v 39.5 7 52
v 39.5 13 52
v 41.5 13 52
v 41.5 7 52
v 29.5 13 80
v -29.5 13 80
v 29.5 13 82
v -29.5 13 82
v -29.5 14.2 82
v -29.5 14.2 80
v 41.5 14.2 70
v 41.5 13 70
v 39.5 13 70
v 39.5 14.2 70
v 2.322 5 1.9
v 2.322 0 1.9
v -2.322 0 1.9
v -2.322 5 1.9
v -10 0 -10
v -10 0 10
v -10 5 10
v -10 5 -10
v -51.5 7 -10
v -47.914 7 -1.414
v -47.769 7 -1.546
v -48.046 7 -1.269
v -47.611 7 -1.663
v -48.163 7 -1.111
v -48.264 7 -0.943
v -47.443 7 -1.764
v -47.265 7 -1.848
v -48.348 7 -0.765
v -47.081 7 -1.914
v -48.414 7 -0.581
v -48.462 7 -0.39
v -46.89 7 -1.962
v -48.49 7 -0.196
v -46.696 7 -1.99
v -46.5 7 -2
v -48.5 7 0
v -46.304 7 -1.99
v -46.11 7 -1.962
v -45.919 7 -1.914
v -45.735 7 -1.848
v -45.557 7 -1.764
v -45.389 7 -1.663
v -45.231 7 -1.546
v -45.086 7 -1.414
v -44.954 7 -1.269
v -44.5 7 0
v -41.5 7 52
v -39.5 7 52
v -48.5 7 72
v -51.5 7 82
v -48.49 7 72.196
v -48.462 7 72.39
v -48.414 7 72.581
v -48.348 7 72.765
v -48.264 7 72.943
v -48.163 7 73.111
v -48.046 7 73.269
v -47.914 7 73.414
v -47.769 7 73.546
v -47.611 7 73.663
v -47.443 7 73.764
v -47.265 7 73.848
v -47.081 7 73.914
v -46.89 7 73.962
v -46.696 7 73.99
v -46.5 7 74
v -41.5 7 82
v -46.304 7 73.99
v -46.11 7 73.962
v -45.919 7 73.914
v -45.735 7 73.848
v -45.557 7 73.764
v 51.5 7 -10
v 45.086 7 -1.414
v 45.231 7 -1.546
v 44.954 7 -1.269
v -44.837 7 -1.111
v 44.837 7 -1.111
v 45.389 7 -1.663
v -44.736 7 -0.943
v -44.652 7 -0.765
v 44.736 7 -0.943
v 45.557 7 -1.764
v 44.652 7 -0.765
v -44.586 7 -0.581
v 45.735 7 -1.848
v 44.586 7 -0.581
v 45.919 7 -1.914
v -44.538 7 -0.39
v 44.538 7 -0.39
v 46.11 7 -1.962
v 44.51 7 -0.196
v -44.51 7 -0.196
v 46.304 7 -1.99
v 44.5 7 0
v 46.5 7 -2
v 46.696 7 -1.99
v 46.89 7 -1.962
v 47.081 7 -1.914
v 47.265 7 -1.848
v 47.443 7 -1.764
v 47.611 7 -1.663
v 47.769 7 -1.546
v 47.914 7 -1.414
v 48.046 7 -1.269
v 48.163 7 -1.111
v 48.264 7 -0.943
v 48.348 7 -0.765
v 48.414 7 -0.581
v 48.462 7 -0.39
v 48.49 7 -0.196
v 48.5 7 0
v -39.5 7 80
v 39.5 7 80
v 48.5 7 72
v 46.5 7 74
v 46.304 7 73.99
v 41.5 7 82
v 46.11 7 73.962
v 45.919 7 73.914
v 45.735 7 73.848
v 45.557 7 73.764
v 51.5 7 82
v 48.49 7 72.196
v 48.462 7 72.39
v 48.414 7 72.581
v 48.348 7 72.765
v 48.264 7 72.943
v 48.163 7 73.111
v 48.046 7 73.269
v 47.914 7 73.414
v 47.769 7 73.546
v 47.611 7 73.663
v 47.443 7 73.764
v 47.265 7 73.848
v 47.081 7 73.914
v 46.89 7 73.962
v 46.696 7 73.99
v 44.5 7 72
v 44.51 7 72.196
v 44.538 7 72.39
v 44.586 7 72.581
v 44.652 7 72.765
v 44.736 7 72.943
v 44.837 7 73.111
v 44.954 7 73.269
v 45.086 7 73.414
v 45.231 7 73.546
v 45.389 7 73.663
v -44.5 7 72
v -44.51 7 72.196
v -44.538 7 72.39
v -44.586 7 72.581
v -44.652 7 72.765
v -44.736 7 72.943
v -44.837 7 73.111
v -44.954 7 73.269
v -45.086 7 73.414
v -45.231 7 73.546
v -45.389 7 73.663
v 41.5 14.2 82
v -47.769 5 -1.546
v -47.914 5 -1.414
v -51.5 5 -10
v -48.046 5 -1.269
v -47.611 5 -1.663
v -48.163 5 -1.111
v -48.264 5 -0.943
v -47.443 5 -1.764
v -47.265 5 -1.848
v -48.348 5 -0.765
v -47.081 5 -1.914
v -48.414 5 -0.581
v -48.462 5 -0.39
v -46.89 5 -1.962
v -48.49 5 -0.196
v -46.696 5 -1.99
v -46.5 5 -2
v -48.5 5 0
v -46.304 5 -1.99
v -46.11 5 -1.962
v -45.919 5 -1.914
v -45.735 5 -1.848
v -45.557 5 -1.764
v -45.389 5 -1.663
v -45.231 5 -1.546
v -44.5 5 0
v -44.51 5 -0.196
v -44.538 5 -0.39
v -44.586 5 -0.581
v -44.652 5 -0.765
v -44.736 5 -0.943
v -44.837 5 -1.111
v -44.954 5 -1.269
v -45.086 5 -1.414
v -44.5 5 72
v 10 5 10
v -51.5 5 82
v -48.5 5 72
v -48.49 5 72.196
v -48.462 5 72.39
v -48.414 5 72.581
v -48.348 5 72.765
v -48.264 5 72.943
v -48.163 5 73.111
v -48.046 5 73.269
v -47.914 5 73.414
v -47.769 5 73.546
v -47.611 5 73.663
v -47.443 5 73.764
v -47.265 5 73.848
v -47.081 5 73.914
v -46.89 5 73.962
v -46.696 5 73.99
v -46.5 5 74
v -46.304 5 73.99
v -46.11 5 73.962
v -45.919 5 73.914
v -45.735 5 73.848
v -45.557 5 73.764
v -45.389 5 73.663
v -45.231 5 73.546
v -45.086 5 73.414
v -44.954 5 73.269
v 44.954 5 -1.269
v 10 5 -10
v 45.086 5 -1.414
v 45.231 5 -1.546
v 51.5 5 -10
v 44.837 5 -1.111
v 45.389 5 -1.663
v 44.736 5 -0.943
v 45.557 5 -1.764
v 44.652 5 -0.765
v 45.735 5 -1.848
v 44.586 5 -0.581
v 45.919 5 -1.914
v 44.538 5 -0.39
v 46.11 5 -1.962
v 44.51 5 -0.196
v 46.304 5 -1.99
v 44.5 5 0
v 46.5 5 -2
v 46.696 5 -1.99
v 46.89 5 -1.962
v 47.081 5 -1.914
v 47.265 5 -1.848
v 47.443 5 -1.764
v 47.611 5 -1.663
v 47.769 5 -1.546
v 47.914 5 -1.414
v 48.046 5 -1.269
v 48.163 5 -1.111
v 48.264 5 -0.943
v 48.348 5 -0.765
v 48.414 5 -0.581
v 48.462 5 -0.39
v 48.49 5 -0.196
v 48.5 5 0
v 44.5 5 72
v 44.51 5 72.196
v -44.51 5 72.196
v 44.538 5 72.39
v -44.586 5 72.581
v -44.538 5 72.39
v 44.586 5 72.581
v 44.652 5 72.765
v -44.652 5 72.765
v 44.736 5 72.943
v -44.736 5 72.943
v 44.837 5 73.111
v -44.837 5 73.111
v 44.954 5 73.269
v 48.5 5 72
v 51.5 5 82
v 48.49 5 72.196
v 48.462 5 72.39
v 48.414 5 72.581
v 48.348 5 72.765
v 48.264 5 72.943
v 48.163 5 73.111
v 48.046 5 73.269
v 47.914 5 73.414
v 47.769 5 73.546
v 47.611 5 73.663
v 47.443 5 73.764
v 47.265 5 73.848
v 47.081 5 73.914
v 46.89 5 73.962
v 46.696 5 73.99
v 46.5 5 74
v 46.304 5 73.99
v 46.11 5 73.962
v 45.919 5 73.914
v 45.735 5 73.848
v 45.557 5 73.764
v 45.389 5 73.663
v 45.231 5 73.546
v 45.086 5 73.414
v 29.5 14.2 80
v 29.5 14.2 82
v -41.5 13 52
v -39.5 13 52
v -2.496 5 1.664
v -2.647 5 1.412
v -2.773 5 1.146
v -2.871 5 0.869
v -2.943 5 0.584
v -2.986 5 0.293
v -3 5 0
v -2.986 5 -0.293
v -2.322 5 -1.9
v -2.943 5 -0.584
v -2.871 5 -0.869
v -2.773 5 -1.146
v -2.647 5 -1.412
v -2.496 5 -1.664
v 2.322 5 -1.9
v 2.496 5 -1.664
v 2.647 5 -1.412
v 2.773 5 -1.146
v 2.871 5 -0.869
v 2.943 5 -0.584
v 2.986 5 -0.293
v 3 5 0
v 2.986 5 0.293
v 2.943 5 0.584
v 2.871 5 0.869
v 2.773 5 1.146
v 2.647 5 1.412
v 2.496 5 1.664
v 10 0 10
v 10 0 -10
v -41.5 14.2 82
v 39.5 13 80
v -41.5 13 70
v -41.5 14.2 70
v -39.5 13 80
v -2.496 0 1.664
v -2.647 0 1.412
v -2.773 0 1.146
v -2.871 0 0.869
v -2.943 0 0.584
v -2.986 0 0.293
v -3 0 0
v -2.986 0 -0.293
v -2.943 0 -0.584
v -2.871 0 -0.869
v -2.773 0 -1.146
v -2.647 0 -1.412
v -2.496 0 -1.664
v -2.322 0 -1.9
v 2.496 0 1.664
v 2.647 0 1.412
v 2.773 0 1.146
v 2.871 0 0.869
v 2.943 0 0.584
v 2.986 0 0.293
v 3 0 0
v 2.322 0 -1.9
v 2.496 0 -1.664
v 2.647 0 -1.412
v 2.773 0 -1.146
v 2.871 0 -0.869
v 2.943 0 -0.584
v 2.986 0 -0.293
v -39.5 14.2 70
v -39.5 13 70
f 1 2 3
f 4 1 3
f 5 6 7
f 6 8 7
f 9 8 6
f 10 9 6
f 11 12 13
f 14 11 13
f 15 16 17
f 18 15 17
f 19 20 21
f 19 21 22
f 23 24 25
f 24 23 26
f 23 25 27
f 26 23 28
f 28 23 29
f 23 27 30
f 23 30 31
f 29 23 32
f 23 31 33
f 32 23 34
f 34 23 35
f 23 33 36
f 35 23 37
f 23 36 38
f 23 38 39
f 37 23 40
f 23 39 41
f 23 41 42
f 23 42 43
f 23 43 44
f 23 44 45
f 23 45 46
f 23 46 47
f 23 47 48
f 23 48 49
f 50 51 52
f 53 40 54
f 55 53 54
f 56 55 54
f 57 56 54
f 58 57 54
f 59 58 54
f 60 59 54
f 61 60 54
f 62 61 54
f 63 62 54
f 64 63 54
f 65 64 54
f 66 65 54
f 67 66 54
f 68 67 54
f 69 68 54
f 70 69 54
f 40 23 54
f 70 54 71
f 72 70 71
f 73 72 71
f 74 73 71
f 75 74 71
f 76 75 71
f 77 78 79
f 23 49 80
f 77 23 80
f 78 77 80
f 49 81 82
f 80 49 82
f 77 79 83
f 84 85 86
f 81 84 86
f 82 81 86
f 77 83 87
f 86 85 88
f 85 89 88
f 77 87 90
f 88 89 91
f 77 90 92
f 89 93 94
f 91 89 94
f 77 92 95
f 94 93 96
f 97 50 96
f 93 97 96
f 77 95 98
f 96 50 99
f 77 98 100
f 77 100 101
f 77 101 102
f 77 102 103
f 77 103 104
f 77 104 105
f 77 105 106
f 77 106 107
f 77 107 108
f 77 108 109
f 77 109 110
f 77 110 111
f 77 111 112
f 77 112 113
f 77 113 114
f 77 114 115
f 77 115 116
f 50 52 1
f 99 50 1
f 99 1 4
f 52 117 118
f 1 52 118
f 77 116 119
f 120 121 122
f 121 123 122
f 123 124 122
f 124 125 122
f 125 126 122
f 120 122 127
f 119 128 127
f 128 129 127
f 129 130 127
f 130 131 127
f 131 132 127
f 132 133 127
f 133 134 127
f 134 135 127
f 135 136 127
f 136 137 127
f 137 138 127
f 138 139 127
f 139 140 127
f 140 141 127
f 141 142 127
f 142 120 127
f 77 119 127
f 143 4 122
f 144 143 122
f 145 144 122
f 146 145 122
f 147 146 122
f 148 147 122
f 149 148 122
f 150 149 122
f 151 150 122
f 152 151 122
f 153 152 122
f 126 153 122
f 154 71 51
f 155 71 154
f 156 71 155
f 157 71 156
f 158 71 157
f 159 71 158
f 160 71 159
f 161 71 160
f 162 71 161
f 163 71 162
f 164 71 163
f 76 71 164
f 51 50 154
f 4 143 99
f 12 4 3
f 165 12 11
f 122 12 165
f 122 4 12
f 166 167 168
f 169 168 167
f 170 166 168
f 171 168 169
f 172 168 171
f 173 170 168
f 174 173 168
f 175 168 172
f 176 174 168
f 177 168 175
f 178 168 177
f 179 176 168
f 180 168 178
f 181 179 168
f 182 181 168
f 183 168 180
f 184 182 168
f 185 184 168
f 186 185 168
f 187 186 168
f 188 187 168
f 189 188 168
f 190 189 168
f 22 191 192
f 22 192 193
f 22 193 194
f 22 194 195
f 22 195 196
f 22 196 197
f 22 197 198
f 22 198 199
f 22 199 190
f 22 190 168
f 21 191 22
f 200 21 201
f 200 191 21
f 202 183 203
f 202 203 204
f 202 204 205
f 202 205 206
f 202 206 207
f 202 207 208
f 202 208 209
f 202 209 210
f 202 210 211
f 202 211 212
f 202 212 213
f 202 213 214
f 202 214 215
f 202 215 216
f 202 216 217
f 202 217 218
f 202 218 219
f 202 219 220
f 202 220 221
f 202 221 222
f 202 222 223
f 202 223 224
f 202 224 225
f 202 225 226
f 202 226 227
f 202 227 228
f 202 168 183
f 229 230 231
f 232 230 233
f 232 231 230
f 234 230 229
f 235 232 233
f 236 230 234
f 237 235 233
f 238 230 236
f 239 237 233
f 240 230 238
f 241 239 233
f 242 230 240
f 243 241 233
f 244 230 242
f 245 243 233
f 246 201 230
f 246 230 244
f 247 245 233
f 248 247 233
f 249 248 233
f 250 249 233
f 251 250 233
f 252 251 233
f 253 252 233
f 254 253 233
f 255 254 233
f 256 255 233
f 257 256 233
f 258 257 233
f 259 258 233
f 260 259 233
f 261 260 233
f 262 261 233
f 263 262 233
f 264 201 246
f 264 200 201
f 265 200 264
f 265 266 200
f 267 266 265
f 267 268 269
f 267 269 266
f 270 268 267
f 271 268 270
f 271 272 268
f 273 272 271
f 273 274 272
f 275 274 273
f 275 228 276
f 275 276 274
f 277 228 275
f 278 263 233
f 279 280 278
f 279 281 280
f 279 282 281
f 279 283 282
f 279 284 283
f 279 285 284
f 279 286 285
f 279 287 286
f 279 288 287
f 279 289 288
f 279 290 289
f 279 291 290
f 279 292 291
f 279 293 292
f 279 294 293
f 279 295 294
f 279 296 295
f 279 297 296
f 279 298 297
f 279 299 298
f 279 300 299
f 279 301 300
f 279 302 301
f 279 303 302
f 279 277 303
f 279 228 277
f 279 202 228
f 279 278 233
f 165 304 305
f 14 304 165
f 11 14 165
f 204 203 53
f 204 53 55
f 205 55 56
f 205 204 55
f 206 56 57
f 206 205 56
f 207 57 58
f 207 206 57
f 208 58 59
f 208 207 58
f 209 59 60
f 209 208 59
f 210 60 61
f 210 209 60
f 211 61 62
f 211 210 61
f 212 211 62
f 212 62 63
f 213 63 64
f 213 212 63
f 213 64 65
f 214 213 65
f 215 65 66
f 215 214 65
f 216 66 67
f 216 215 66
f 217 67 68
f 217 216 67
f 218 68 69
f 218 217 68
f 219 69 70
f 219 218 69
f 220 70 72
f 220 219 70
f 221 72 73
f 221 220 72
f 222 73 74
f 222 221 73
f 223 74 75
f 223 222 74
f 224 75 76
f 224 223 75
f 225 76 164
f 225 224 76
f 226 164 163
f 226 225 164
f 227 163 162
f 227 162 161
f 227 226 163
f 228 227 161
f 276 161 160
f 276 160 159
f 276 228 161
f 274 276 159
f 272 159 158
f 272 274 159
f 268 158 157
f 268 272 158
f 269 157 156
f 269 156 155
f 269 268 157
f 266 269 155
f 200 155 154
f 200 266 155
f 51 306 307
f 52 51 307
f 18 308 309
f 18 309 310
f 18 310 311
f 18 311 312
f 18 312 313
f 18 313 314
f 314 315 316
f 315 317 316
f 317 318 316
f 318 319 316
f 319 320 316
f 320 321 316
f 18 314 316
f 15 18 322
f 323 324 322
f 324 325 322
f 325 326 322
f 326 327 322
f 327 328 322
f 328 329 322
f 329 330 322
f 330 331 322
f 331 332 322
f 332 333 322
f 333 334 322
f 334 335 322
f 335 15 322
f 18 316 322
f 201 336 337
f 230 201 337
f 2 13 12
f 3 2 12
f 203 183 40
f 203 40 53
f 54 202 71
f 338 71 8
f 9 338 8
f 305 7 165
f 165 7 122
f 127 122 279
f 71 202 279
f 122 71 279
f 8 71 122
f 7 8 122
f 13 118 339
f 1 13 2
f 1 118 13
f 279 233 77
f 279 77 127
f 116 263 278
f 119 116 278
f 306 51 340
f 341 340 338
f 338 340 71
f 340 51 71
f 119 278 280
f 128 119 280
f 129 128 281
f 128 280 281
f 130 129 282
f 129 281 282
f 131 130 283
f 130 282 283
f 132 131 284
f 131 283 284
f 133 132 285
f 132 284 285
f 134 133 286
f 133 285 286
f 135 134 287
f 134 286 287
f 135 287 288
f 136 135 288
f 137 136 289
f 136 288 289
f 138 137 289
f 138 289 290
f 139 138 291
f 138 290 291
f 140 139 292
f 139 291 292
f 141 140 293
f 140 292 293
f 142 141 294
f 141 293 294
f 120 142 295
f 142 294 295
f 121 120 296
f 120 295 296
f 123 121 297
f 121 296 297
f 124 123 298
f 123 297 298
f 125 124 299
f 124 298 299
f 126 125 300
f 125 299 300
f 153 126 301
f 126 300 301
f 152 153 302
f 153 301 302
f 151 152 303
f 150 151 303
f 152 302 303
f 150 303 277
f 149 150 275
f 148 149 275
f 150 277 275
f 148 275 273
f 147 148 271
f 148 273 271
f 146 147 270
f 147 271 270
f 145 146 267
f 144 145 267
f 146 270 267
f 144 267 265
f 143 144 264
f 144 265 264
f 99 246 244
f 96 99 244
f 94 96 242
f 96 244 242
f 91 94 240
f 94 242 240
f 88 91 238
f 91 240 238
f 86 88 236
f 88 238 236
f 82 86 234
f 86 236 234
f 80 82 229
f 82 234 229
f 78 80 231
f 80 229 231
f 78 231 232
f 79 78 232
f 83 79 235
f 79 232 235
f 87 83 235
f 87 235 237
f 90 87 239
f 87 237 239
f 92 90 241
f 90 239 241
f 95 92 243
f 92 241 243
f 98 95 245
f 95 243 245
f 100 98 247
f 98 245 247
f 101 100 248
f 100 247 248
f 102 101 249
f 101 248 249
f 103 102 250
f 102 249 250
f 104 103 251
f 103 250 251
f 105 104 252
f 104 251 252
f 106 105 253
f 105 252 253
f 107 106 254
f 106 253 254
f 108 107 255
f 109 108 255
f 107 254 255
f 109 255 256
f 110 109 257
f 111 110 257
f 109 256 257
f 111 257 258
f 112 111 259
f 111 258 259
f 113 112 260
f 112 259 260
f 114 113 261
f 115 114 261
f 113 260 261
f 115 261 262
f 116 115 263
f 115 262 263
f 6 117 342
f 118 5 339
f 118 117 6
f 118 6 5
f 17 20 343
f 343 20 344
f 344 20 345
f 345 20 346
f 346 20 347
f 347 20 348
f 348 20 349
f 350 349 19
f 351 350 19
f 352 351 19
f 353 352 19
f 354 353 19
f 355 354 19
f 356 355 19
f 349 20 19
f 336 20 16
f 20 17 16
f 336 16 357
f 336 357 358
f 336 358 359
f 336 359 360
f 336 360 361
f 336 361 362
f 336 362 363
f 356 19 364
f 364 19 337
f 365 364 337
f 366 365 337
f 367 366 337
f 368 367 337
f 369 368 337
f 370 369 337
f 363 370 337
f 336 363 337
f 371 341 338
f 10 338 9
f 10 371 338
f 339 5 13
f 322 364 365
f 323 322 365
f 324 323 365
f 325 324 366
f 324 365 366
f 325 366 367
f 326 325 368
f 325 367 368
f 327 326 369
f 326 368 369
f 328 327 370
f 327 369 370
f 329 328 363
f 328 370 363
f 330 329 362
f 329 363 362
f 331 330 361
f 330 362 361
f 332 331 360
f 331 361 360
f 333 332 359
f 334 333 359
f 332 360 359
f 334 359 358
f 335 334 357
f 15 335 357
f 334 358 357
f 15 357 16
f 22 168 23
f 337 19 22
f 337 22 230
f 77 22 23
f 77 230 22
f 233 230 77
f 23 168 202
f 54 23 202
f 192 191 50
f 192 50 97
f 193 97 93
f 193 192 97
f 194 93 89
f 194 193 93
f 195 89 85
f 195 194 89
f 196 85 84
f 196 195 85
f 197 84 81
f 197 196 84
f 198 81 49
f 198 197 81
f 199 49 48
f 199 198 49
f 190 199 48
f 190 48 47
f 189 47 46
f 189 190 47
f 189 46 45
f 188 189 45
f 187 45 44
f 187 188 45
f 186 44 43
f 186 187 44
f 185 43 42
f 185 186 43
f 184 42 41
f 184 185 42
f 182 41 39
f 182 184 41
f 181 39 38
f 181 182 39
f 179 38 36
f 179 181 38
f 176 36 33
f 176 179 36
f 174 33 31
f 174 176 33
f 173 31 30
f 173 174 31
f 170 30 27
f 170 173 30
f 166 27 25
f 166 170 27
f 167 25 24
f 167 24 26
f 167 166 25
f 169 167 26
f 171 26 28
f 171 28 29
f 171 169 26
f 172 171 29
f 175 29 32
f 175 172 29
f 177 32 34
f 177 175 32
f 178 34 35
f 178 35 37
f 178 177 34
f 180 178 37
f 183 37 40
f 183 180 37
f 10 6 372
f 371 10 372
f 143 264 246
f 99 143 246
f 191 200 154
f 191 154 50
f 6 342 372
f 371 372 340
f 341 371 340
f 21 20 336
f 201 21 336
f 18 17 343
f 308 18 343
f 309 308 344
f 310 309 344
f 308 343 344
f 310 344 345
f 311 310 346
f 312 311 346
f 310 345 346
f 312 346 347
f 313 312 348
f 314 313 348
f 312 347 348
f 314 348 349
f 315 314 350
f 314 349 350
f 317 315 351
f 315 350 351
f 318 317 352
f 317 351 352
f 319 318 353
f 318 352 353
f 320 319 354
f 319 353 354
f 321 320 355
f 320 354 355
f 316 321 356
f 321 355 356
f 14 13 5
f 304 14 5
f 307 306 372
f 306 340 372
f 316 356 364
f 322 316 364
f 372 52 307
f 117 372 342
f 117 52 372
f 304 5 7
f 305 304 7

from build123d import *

# Parameters (mm, degrees)
CROQUIS1_W              = 20
CROQUIS1_H              = 20
CROQUIS1_R              = 3
SALIENTE_EXTRUIR1_DEPTH = 5
SALIENTE_EXTRUIR2_DEPTH = 2
SALIENTE_EXTRUIR3_DEPTH = 8
SALIENTE_EXTRUIR4_DEPTH = 1.2
CROQUIS5_W              = 10
CROQUIS5_H              = 92
SALIENTE_EXTRUIR5_DEPTH = 2
CROQUIS6_W              = 83
CROQUIS6_H              = 62
CORTAR_EXTRUIR1_DEPTH   = 6


with BuildPart() as part:
    # Croquis1 → Saliente-Extruir1 (new body)
    with BuildSketch(Plane(origin=(0, 0, 0), x_dir=(1, 0, 0), z_dir=(0, 1, 0))):
        Rectangle(CROQUIS1_W, CROQUIS1_H)
        Circle(CROQUIS1_R, mode=Mode.SUBTRACT)
        with BuildLine():
            Line((2.321637353, -1.9), (-2.321637353, -1.9))
            ThreePointArc((-2.321637353, -1.9), (0, -3), (2.321637353, -1.9))
        make_face()
        with BuildLine():
            Line((-2.321637353, 1.9), (2.321637353, 1.9))
            ThreePointArc((2.321637353, 1.9), (0, 3), (-2.321637353, 1.9))
        make_face()
    extrude(amount=SALIENTE_EXTRUIR1_DEPTH)

    # Croquis2 → Saliente-Extruir2 (add)
    with BuildSketch(Plane(origin=(0, 5, 0), x_dir=(1, 0, 0), z_dir=(0, 1, 0))):
        Polygon((-10, 10), (-39.5, 10), (-39.5, 0), (-39.5, -80), (39.5, -80), (39.5, 0), (39.5, 10), (10, 10), align=None)
    extrude(amount=SALIENTE_EXTRUIR2_DEPTH)

    # Croquis3 → Saliente-Extruir3 (add)
    with BuildSketch(Plane.XZ.offset(-5)):
        Polygon((39.5, 80), (39.5, -10), (41.5, -10), (41.5, 82), (-41.5, 82), (-41.5, -10), (-39.5, -10), (-39.5, 80), align=None)
    extrude(amount=-SALIENTE_EXTRUIR3_DEPTH)

    # Croquis4 → Saliente-Extruir4 (add)
    with BuildSketch(Plane(origin=(0, 13, 0), x_dir=(1, 0, 0), z_dir=(0, 1, 0))):
        Polygon((-39.5, -80), (-29.5, -80), (-39.5, -70), align=None)
        Polygon((-29.5, -82), (-29.5, -80), (-39.5, -80), (-39.5, -70), (-41.5, -70), (-41.5, -82), align=None)
        Polygon((39.5, -70), (29.5, -80), (39.5, -80), align=None)
        Polygon((39.5, -80), (29.5, -80), (29.5, -82), (41.5, -82), (41.5, -70), (39.5, -70), align=None)
    extrude(amount=SALIENTE_EXTRUIR4_DEPTH)

    # Croquis5 → Saliente-Extruir5 (add)
    with BuildSketch(Plane.XZ.offset(-5)):
        with Locations((-46.5, 36)):
            Rectangle(CROQUIS5_W, CROQUIS5_H)
        with BuildLine():
            Line((-48.5, 0), (-48.5, 72))
            ThreePointArc((-48.5, 72), (-46.5, 74), (-44.5, 72))
            Line((-44.5, 72), (-44.5, 0))
            ThreePointArc((-44.5, 0), (-46.5, -2), (-48.5, 0))
        make_face(mode=Mode.SUBTRACT)
        with Locations((46.5, 36)):
            Rectangle(CROQUIS5_W, CROQUIS5_H)
        with BuildLine():
            Line((48.5, 0), (48.5, 72))
            ThreePointArc((48.5, 72), (46.5, 74), (44.5, 72))
            Line((44.5, 72), (44.5, 0))
            ThreePointArc((44.5, 0), (46.5, -2), (48.5, 0))
        make_face(mode=Mode.SUBTRACT)
    extrude(amount=-SALIENTE_EXTRUIR5_DEPTH)

    # Croquis6 → Cortar-Extruir1 (cut)
    with BuildSketch(Plane(origin=(0, 13, 0), x_dir=(1, 0, 0), z_dir=(0, 1, 0))):
        with Locations((0, -21)):
            Rectangle(CROQUIS6_W, CROQUIS6_H)
    extrude(amount=-CORTAR_EXTRUIR1_DEPTH, mode=Mode.SUBTRACT)


solid = part.part
